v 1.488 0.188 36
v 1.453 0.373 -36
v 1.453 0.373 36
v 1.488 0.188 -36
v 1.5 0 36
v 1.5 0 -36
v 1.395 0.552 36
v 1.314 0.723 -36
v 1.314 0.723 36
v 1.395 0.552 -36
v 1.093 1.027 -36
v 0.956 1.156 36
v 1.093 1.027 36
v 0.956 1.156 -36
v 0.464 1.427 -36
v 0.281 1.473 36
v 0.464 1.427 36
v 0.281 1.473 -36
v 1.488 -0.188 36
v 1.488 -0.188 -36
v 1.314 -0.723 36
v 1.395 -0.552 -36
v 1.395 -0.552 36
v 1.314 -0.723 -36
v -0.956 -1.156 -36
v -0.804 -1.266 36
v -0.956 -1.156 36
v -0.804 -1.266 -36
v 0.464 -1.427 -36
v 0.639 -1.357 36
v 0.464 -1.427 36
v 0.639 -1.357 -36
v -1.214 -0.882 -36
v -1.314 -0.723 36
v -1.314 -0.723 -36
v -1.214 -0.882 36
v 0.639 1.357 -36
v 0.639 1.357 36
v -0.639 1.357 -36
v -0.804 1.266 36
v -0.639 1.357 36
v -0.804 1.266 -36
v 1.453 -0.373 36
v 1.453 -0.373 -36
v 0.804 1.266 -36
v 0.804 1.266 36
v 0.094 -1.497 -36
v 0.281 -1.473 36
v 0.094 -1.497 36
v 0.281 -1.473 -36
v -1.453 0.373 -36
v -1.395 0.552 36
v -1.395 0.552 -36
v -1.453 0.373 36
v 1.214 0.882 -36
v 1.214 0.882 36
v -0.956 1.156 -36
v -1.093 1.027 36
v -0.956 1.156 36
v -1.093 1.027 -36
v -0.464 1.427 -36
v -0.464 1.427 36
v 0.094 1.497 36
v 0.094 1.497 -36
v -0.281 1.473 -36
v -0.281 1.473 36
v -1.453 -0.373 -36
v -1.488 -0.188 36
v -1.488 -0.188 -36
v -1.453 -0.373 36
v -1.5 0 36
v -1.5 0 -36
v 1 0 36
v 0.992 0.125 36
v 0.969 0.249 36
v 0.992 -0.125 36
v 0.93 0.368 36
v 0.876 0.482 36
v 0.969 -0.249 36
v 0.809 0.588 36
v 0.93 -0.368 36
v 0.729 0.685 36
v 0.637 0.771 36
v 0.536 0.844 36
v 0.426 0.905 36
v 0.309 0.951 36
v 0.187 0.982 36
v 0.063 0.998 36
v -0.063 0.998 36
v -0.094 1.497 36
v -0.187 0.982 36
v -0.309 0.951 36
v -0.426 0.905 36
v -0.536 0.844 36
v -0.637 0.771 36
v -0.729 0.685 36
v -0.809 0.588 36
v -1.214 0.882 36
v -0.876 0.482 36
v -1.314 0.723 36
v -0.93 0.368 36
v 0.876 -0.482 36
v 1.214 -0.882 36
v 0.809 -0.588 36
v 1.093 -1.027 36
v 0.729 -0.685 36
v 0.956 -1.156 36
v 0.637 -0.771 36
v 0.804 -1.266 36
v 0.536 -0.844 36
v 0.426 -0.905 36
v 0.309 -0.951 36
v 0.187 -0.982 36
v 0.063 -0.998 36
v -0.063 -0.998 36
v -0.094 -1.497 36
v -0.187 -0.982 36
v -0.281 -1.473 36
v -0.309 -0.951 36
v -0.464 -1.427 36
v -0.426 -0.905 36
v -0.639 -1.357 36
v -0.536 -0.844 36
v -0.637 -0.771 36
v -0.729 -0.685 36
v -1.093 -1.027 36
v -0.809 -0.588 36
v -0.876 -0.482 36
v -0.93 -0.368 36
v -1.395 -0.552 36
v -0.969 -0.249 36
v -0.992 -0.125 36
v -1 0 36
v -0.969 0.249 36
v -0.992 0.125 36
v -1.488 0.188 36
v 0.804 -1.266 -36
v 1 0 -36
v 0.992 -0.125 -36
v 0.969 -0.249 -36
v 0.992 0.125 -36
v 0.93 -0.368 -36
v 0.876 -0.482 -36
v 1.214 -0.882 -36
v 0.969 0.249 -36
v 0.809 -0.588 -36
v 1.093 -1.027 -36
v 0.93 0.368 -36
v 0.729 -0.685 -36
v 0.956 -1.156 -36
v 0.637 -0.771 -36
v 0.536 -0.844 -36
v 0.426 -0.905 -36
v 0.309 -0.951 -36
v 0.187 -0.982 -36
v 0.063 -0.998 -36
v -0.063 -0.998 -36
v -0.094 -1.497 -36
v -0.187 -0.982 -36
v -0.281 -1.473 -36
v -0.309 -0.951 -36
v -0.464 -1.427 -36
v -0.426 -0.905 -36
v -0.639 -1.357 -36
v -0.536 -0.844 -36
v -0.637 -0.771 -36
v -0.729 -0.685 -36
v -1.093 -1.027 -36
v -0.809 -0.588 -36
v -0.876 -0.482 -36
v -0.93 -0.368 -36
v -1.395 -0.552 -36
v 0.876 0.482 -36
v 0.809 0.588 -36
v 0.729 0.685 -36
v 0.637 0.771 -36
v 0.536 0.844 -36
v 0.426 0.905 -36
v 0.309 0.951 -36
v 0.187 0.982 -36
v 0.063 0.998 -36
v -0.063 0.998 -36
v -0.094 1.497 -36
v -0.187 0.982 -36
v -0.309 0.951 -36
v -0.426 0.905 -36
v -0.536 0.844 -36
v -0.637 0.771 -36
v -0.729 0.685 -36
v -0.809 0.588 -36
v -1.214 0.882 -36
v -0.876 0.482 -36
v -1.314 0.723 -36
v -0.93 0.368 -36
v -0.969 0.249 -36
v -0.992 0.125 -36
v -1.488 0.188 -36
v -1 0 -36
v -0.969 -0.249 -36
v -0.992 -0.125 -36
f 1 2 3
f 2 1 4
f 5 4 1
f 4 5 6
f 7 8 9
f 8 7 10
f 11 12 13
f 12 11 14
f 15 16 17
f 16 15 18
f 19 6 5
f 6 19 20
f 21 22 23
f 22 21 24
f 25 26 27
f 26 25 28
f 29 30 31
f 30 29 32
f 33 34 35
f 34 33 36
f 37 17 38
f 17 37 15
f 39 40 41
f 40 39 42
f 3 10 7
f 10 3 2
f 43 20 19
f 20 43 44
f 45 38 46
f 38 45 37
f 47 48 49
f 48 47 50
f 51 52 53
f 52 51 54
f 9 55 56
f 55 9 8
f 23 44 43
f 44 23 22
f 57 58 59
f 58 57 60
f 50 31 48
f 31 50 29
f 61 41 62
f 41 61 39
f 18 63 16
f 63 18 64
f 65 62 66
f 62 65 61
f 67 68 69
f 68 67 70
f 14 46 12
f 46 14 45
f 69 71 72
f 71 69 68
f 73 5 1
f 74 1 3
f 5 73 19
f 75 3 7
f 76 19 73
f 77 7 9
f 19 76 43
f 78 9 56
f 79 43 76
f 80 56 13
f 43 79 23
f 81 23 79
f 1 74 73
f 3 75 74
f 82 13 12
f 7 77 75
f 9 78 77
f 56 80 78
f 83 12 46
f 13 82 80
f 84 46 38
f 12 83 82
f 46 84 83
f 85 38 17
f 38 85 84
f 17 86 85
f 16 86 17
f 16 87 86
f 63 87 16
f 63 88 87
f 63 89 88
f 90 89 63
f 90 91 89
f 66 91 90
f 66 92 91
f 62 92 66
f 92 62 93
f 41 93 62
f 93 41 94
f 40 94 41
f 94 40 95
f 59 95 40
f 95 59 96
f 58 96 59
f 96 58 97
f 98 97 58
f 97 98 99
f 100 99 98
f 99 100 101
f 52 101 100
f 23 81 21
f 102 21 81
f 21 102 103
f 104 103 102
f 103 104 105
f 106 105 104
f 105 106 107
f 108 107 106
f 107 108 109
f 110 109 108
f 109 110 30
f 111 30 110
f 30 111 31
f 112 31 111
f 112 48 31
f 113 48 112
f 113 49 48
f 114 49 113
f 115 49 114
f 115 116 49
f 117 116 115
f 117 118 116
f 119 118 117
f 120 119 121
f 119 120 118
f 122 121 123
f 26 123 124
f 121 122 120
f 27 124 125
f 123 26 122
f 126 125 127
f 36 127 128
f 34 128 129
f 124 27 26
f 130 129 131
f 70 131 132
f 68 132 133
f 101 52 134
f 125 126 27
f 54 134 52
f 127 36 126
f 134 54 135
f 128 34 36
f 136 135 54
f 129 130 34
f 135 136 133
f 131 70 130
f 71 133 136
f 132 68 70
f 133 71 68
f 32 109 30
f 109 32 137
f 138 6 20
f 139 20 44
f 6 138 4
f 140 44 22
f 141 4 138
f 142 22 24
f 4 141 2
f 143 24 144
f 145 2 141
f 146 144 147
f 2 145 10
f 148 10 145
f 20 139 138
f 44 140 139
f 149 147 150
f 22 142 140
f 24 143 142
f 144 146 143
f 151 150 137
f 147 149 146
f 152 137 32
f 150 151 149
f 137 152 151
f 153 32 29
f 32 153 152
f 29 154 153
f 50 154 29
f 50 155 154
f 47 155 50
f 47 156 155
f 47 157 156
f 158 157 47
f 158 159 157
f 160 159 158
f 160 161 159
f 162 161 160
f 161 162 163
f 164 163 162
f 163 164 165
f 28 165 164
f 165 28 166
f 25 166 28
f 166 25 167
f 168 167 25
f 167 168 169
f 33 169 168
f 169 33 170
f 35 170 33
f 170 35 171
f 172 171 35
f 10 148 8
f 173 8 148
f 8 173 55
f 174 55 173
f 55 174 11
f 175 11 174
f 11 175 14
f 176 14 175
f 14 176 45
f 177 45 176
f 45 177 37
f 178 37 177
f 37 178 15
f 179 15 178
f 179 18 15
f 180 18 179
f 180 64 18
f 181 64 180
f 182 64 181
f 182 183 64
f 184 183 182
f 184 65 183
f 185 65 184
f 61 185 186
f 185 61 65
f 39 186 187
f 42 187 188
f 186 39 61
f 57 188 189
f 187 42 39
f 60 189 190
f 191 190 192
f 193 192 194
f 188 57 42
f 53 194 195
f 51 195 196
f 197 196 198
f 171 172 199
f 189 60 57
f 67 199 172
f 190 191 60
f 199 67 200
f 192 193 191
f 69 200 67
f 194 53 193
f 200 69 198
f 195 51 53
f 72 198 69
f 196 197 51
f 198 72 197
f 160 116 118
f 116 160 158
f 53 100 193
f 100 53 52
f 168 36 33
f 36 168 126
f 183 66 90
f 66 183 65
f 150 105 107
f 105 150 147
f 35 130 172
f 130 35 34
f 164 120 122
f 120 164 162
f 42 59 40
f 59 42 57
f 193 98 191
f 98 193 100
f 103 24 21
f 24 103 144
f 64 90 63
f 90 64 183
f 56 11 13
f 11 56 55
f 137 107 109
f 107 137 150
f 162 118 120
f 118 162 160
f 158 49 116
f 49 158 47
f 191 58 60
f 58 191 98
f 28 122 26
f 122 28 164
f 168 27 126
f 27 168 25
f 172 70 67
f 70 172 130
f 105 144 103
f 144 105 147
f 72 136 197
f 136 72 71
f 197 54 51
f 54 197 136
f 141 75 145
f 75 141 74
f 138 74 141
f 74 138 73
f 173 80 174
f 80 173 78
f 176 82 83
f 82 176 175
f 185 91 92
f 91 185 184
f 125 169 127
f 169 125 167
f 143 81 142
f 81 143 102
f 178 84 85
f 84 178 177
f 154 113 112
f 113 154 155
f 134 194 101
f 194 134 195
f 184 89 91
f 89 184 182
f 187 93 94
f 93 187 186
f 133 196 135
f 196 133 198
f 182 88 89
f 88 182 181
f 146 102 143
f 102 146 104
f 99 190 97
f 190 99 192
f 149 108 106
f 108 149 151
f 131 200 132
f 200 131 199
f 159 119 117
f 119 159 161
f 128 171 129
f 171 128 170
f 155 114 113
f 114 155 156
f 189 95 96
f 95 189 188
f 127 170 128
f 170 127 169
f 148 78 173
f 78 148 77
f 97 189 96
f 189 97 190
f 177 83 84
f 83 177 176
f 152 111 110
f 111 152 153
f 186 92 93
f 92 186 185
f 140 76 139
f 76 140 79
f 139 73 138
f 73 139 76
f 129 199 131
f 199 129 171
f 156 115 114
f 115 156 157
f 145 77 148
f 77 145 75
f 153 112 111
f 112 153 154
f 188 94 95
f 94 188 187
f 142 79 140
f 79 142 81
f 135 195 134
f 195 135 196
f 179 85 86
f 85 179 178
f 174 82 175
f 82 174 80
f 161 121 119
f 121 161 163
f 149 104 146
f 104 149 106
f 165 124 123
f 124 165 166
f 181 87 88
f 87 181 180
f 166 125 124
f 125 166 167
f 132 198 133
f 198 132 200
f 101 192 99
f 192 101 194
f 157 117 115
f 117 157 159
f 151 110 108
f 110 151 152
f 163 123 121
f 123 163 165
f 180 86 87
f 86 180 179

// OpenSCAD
$fn = 50;


difference() {
	union() {
		translate(v = [0, 0, -36.0000000000]) {
			cylinder(h = 72, r = 1.5000000000);
		}
	}
	union() {
		translate(v = [0, 0, -100.0000000000]) {
			cylinder(h = 200, r = 1.0000000000);
		}
	}
}
